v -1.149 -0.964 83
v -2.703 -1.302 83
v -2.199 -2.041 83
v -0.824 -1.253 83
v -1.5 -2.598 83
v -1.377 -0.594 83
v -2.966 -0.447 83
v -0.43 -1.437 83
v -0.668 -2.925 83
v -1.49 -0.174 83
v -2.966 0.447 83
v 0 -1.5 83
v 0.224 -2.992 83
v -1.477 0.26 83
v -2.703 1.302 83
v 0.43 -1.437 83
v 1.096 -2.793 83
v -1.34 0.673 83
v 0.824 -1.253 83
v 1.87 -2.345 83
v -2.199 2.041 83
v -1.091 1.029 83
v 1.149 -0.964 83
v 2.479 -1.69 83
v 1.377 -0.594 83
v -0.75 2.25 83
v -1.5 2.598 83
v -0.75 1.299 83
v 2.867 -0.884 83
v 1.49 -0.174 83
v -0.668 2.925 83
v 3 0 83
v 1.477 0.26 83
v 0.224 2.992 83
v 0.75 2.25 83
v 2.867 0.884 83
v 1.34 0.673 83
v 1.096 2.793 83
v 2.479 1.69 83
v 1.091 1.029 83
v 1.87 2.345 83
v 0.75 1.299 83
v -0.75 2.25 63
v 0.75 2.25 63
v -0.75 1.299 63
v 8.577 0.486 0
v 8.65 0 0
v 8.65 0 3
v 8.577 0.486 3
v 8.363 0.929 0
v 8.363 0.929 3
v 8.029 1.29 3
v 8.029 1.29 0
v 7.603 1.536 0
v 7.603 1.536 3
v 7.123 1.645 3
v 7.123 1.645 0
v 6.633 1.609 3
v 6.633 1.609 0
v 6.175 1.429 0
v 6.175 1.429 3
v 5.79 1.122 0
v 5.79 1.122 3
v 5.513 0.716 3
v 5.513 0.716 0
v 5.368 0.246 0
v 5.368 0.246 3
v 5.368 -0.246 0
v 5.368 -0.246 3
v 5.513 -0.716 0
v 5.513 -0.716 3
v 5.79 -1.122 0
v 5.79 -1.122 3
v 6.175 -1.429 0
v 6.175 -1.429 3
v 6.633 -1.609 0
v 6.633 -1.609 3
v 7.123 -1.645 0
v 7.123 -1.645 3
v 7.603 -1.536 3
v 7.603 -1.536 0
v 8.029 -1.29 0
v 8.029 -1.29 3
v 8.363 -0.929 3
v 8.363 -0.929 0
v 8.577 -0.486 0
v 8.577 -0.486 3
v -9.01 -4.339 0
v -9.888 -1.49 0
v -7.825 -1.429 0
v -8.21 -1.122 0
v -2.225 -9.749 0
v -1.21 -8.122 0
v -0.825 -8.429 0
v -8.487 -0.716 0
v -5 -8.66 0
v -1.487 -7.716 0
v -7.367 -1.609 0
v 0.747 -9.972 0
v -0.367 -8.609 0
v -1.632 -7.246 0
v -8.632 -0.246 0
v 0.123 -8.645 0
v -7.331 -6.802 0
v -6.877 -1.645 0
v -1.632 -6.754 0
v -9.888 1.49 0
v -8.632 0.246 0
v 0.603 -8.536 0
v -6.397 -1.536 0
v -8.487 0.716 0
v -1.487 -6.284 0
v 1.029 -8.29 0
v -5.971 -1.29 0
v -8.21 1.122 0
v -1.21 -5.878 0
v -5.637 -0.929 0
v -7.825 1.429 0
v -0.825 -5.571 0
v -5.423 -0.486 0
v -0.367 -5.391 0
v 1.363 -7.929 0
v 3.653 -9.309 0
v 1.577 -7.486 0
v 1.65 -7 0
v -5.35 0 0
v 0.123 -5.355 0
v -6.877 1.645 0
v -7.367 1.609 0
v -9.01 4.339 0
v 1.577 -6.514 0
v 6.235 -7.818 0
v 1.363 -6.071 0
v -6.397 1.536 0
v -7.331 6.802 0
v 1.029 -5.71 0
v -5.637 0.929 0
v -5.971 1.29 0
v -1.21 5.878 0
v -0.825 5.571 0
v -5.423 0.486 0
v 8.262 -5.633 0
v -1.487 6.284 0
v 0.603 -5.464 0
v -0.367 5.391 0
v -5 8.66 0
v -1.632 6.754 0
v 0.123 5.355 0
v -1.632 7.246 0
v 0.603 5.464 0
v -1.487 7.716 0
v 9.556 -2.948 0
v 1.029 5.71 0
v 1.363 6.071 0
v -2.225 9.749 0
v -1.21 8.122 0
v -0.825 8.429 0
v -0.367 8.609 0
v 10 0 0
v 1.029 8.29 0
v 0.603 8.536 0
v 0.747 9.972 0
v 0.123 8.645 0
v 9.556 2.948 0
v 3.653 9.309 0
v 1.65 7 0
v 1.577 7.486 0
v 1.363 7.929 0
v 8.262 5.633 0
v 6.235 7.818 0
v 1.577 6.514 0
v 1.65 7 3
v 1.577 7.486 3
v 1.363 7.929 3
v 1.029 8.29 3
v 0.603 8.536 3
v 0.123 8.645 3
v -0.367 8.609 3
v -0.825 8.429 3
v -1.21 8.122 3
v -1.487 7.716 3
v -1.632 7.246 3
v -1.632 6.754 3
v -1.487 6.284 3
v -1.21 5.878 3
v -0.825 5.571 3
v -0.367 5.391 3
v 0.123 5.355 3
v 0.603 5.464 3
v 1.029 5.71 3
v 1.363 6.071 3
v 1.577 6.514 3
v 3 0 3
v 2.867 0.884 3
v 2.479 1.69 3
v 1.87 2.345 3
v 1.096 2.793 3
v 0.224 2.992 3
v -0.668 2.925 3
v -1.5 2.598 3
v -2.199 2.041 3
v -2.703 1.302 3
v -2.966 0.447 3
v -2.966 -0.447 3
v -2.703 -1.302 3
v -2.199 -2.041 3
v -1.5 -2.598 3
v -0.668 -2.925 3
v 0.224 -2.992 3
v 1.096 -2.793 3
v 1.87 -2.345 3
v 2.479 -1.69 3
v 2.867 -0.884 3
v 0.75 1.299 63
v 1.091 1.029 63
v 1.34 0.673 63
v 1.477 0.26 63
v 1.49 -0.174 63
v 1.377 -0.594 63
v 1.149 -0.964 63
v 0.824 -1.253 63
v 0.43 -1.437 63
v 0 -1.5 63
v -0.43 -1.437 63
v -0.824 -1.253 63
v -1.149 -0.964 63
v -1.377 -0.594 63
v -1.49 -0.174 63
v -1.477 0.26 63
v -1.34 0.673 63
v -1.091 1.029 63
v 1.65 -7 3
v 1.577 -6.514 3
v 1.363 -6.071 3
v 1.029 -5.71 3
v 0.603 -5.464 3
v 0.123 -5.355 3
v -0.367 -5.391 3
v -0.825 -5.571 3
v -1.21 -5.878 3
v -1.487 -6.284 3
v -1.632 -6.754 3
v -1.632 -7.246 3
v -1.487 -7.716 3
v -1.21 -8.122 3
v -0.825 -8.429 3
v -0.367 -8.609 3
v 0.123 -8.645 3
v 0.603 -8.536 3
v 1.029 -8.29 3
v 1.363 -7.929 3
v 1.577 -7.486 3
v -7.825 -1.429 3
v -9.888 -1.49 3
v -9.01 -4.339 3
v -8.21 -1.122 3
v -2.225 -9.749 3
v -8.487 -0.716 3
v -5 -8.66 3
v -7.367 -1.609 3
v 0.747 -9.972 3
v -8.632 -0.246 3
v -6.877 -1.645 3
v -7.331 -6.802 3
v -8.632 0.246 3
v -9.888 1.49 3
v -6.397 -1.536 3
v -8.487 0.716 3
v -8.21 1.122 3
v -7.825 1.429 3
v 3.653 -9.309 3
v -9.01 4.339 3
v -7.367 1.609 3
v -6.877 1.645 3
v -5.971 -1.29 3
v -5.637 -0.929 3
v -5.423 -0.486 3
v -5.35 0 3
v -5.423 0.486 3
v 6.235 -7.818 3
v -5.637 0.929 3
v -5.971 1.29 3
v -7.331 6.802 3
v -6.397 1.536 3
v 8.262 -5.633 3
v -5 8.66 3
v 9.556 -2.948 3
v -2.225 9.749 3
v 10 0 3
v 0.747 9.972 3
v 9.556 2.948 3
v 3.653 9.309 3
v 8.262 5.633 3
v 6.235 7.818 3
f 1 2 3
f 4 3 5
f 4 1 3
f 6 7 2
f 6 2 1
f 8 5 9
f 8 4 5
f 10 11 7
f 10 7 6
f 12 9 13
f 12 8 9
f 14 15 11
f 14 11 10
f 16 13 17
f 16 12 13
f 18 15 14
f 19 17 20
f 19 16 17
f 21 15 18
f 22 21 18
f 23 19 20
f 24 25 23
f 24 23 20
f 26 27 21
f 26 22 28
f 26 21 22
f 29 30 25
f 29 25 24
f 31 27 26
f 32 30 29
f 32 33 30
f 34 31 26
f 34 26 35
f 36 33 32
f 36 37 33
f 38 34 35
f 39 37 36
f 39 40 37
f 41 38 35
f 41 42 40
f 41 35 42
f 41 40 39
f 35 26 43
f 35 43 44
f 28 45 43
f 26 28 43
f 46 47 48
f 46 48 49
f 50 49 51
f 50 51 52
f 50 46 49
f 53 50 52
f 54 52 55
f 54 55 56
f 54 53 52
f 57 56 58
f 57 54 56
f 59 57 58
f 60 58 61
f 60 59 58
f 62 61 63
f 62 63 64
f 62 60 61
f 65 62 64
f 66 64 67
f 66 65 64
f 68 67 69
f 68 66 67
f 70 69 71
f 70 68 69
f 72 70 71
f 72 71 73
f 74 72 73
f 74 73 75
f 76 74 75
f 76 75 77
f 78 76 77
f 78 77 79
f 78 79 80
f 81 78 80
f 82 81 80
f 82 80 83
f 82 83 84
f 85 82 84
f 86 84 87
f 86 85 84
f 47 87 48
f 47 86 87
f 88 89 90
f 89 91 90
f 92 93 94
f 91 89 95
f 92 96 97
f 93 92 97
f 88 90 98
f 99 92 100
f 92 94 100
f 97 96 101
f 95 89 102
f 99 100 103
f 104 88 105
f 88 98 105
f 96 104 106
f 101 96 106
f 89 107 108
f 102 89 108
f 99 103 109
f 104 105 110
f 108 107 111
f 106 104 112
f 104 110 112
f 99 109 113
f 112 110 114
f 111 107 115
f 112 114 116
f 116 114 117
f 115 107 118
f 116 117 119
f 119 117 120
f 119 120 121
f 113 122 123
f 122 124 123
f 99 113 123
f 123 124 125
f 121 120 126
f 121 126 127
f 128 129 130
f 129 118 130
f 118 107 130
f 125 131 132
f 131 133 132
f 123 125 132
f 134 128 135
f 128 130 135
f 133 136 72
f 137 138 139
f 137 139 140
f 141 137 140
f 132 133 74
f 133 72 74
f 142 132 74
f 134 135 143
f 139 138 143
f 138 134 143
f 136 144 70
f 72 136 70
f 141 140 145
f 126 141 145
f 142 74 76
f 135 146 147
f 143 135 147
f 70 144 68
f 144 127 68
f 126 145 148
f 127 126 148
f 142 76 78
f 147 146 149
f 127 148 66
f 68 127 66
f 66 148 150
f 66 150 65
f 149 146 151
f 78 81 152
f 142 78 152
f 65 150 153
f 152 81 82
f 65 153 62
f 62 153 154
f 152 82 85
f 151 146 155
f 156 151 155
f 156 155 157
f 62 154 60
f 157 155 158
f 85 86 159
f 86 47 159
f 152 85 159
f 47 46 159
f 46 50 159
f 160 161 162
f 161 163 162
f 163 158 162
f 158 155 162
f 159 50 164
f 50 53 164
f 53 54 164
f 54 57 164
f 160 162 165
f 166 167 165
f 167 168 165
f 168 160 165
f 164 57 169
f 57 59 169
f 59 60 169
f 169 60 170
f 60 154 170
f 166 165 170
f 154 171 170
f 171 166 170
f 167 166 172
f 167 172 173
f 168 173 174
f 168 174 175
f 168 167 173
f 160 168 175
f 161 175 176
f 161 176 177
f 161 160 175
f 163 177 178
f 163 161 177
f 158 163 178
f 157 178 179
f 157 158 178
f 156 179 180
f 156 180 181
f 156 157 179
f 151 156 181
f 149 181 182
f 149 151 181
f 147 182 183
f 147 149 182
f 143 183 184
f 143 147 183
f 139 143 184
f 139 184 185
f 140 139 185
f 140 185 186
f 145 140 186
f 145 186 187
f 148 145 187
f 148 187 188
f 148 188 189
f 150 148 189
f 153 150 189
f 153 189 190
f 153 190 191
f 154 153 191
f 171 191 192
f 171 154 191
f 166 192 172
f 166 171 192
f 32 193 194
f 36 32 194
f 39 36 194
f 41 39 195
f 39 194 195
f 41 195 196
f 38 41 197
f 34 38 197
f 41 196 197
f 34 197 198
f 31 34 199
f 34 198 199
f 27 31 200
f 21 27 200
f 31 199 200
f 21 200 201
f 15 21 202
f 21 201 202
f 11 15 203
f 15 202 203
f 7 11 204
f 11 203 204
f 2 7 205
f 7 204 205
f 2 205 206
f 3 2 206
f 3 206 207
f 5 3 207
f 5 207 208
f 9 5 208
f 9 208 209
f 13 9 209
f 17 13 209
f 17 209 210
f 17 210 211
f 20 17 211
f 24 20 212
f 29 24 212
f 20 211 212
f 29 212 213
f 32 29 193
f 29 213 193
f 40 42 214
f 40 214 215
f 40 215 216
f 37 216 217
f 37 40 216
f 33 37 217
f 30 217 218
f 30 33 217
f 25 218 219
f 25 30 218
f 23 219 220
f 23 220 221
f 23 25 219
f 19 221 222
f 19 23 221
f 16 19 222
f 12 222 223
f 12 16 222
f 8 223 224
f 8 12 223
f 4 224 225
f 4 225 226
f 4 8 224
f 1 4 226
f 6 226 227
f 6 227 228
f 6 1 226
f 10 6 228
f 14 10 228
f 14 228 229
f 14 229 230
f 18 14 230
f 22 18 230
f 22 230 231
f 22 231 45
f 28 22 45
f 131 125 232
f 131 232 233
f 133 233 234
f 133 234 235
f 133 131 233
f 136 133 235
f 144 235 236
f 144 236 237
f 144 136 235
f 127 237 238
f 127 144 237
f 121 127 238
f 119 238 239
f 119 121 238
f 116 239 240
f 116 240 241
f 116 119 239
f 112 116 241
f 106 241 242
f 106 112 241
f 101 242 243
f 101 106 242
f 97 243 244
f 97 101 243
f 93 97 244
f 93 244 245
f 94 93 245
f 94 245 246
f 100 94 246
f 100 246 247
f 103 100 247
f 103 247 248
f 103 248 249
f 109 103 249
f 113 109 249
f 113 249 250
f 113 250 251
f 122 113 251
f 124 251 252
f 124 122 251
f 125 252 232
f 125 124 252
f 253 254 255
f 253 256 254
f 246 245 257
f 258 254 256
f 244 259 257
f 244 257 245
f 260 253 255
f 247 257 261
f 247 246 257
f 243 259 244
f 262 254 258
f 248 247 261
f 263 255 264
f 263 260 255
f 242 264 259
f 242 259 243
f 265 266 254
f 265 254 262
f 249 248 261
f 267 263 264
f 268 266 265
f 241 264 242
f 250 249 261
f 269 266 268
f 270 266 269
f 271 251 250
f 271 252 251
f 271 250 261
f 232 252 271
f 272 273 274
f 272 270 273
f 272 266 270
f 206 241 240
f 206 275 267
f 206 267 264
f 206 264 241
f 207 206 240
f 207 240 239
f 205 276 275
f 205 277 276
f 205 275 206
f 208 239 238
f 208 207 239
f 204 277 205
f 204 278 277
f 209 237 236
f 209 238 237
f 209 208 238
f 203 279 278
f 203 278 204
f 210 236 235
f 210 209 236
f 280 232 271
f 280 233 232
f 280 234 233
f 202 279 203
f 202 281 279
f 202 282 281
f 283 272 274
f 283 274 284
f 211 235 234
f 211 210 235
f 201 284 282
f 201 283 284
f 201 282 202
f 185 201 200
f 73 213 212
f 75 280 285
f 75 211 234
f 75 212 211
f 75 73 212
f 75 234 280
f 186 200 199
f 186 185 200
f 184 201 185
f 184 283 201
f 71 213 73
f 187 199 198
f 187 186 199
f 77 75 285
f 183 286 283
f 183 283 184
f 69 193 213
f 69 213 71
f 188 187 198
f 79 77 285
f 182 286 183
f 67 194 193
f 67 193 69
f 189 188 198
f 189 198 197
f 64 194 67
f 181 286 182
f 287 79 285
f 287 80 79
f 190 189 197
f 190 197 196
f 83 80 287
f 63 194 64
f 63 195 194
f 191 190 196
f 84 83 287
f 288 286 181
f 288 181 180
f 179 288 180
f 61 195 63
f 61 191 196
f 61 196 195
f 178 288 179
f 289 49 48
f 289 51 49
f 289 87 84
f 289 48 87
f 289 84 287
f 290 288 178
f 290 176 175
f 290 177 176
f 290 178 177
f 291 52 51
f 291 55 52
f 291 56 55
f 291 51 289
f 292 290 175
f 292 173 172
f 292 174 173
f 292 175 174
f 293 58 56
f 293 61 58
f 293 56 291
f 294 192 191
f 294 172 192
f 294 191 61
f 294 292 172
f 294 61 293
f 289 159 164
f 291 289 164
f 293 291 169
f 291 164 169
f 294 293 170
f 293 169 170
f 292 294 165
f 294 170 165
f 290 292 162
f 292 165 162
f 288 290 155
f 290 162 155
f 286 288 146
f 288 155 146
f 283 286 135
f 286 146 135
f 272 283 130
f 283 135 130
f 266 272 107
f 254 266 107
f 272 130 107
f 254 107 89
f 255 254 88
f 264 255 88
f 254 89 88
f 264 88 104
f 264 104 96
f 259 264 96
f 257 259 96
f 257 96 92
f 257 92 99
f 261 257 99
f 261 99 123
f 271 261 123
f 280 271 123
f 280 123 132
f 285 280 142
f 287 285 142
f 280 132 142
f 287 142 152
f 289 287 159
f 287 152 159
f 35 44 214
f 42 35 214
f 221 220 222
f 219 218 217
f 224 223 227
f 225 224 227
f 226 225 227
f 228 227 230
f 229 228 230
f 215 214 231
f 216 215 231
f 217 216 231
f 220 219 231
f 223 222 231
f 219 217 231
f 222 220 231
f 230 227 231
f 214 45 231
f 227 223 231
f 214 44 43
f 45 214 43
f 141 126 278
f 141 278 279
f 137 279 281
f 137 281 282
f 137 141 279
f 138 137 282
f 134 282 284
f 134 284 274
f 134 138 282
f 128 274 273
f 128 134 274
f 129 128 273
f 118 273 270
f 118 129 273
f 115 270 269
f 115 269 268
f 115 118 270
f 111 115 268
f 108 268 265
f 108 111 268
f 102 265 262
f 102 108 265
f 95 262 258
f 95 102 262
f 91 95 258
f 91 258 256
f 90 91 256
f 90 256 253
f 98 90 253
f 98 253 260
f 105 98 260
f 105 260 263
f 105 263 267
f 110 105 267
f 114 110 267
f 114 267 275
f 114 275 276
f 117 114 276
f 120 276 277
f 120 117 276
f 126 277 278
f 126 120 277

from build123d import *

# Parameters (mm, degrees)
SKETCH_1_R          = 10
SKETCH_1_R_2        = 1.65
EXTRUDE_1_DEPTH     = 3
SKETCH_2_R          = 3
EXTRUDE_2_DEPTH     = 80
CUT_EXTRUDE_1_DEPTH = 20


with BuildPart() as part:
    # 草图1 → 凸台-拉伸1 (new body)
    with BuildSketch(Plane.XY):
        Circle(SKETCH_1_R)
        with Locations((0, 7)):
            Circle(SKETCH_1_R_2, mode=Mode.SUBTRACT)
        with Locations((7, 0)):
            Circle(SKETCH_1_R_2, mode=Mode.SUBTRACT)
        with Locations((0, -7)):
            Circle(SKETCH_1_R_2, mode=Mode.SUBTRACT)
        with Locations((-7, 0)):
            Circle(SKETCH_1_R_2, mode=Mode.SUBTRACT)
    extrude(amount=EXTRUDE_1_DEPTH)

    # 草图2 → 凸台-拉伸2 (add)
    with BuildSketch(Plane.XY.offset(3)):
        Circle(SKETCH_2_R)
    extrude(amount=EXTRUDE_2_DEPTH)

    # 草图3 → 切除-拉伸1 (cut)
    with BuildSketch(Plane.XY.offset(83)):
        with BuildLine():
            Line((-0.75, 1.299038106), (-0.75, 2.25))
            Line((-0.75, 2.25), (0.75, 2.25))
            Line((0.75, 2.25), (0.75, 1.299038106))
            ThreePointArc((0.75, 1.299038106), (0, -1.5), (-0.75, 1.299038106))
        make_face()
    extrude(amount=-CUT_EXTRUDE_1_DEPTH, mode=Mode.SUBTRACT)


solid = part.part
